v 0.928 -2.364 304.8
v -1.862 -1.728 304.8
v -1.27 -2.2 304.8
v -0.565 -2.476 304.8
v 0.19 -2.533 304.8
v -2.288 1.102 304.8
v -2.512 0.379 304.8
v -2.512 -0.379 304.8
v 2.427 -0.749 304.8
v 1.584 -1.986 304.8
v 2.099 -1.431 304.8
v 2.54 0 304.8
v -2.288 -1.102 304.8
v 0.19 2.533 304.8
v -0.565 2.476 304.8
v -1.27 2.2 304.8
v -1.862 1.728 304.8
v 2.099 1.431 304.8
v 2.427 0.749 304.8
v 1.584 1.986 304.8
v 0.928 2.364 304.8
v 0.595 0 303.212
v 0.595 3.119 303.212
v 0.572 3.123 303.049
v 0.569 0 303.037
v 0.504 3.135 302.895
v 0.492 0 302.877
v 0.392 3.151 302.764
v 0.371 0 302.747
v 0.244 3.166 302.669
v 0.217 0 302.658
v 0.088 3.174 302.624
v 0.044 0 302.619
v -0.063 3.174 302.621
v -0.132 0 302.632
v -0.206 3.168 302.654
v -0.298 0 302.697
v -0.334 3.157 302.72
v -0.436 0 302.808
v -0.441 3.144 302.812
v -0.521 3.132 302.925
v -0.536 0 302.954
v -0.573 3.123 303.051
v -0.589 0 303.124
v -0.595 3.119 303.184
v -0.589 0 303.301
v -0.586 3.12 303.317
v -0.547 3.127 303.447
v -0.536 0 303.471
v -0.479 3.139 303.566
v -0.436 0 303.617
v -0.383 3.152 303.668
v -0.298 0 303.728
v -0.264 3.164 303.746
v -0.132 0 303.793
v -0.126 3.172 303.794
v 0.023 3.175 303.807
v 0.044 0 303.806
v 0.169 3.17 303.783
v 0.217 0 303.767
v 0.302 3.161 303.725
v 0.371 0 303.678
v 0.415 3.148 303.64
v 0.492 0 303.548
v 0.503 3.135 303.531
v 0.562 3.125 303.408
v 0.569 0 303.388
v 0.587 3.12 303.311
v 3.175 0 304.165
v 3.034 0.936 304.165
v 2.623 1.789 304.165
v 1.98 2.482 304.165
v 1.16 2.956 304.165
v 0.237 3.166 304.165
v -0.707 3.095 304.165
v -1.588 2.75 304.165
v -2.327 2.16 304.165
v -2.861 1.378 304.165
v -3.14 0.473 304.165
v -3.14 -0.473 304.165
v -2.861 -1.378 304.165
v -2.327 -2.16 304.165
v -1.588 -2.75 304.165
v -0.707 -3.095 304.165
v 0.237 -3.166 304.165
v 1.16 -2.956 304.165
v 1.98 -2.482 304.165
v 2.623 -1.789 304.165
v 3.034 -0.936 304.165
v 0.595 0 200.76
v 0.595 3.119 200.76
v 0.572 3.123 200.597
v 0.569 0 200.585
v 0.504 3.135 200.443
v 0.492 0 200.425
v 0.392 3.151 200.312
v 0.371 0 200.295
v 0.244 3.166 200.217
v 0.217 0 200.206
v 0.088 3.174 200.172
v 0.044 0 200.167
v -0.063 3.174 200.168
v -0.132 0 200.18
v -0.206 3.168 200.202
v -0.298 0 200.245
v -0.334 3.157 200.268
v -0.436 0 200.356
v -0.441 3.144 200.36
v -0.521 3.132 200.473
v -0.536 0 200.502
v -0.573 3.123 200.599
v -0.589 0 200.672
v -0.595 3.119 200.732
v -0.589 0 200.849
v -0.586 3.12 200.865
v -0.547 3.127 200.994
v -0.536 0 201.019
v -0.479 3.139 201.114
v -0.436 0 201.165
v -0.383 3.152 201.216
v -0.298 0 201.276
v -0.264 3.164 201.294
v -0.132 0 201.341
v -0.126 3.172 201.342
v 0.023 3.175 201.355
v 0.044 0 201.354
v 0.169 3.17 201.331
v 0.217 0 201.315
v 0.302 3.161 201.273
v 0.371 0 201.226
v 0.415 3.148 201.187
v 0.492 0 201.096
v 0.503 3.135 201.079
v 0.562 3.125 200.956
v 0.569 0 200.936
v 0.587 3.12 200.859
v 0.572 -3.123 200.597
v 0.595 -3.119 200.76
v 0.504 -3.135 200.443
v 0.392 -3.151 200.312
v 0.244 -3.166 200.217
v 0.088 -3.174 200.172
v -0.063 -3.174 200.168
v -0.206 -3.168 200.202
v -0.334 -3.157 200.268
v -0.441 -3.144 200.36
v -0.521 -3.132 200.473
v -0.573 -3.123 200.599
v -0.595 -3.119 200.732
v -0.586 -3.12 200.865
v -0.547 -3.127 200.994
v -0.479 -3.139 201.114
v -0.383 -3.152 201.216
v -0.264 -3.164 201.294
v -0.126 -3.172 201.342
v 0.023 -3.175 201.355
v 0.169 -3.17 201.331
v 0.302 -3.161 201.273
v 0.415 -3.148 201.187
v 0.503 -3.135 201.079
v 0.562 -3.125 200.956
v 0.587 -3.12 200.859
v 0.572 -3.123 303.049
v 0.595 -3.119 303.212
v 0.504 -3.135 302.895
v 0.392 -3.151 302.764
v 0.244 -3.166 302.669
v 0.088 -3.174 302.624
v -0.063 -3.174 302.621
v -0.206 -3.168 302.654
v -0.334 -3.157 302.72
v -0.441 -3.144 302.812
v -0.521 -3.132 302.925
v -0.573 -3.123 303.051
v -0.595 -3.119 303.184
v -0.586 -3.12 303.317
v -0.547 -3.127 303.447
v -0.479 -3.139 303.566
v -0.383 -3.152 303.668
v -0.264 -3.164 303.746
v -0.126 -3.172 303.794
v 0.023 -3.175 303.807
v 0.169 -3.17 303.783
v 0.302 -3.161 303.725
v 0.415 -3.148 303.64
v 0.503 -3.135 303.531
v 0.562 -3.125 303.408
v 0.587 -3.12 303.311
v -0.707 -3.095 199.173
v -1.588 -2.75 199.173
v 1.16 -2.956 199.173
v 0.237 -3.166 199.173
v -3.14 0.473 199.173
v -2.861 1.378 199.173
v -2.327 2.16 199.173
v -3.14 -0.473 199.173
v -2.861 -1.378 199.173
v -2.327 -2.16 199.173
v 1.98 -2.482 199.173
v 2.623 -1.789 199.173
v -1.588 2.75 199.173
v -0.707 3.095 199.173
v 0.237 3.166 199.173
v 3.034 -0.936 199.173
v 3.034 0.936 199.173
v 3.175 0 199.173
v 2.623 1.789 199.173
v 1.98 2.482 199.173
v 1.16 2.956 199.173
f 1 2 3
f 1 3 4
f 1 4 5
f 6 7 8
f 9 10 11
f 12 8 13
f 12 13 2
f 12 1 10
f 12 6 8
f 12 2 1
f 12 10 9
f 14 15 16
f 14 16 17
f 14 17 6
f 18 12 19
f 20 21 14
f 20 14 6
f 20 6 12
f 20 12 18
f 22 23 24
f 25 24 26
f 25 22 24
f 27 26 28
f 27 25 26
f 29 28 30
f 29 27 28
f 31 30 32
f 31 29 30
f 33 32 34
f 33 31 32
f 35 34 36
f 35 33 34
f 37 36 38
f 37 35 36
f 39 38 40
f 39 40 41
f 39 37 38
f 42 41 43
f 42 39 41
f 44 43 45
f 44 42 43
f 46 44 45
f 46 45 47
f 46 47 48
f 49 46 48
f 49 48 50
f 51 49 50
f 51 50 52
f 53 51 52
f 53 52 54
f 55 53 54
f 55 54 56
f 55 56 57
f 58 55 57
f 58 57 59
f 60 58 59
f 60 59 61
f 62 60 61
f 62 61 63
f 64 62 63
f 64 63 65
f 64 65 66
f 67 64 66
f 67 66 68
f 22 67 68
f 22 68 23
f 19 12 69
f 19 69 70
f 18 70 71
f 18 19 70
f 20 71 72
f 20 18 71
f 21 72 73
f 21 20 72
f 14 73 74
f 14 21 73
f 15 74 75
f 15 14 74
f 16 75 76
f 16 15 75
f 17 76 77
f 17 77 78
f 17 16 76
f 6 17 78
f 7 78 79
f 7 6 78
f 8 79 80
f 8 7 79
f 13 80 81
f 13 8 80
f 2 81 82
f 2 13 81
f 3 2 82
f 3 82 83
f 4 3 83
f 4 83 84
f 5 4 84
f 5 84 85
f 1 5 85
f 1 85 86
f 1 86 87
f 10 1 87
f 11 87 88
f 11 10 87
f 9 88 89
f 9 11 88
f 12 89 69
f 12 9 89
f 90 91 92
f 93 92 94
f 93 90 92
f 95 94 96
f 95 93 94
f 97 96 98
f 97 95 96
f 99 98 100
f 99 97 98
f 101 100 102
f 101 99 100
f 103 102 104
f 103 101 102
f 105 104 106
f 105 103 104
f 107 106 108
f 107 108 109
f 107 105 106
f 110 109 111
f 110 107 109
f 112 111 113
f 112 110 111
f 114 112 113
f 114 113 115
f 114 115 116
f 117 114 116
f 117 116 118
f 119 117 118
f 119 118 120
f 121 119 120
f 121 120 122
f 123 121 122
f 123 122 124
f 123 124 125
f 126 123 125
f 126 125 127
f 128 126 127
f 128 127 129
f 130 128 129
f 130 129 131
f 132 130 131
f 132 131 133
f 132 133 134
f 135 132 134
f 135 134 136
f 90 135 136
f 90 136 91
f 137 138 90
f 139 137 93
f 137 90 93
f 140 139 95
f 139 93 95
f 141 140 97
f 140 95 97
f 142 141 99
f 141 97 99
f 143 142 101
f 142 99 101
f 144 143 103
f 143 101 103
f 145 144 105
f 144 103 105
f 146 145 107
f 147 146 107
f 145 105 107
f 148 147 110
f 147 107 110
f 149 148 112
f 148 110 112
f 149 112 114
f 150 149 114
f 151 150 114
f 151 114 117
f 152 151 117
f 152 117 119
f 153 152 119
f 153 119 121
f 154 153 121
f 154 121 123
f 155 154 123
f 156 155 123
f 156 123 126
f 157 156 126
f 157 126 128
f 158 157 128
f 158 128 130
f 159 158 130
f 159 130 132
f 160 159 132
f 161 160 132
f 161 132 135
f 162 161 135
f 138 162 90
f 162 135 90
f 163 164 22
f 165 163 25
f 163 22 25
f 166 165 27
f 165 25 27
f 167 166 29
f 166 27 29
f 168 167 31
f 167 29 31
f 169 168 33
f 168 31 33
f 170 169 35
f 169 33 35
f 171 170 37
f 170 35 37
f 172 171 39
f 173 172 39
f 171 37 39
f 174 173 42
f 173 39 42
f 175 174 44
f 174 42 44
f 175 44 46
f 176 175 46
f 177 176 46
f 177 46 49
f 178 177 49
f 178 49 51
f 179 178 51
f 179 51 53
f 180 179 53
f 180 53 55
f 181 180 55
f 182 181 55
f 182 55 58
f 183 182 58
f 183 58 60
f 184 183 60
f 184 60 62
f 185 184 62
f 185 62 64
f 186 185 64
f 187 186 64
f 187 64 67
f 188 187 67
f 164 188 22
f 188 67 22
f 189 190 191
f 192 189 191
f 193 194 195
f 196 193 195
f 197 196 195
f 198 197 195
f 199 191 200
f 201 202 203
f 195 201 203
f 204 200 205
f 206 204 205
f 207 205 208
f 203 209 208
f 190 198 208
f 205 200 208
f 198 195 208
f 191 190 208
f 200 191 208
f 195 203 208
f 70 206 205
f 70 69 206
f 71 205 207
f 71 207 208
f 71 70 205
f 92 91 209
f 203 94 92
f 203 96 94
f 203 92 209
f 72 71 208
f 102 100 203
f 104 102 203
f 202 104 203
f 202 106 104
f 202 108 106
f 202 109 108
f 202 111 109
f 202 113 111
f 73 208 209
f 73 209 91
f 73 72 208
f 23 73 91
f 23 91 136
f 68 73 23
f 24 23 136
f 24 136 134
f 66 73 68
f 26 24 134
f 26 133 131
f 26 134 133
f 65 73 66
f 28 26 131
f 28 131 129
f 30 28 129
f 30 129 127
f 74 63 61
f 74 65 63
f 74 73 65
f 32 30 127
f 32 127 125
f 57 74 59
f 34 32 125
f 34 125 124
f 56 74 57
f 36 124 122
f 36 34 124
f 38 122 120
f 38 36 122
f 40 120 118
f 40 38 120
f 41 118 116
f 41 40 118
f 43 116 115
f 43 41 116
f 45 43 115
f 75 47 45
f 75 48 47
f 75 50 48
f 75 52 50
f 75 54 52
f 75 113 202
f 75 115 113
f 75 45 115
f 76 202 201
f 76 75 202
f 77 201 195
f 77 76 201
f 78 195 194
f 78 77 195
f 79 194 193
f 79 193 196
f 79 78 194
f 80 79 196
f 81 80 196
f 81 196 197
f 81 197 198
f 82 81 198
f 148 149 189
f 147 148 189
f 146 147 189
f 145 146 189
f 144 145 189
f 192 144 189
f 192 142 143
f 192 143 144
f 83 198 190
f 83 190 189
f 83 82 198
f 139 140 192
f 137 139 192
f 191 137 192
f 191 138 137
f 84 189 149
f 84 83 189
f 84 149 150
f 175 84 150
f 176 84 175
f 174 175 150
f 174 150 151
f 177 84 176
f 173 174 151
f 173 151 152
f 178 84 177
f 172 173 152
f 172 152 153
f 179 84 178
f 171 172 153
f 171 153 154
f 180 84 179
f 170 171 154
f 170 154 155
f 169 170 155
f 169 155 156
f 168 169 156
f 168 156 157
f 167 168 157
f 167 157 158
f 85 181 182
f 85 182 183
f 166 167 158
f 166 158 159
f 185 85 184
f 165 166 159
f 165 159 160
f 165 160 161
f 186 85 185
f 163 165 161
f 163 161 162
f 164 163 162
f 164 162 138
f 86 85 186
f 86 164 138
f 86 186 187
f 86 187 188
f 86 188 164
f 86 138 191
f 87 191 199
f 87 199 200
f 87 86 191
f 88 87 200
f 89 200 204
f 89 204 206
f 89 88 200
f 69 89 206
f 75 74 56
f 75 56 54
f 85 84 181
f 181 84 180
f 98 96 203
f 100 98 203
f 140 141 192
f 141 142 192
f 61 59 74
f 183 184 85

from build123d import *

# Parameters (mm, degrees)
SKETCH3_R               = 3.175
BOSS_EXTRUDE1_DEPTH     = 304.8
CHAMFER1_SIZE           = 0.635
CUT_EXTRUDE1_START      = -105.627050112
SKETCH4_R               = 3.175
CUT_EXTRUDE1_DEPTH      = 504.972949888
SKETCH5_R               = 0.5953125
CUT_EXTRUDE2_DEPTH      = 4.175
CUT_EXTRUDE2_DEPTH_BACK = 4.175


with BuildPart() as part:
    # Sketch3 → Boss-Extrude1 (new body, symmetric)
    with BuildSketch(Plane.XY):
        Circle(SKETCH3_R)
    extrude(amount=BOSS_EXTRUDE1_DEPTH, both=True)

    # Chamfer1
    chamfer1_edges = [part.edges().sort_by_distance(p)[0] for p in [
        (-3.175, 0, -304.8),
        (-3.175, 0, 304.8),
    ]]
    chamfer(chamfer1_edges, length=CHAMFER1_SIZE)

    # Sketch4 → Cut-Extrude1 (cut, through all)
    with BuildSketch(Plane.XY.offset(304.8).offset(CUT_EXTRUDE1_START)):
        Circle(SKETCH4_R)
    extrude(amount=-CUT_EXTRUDE1_DEPTH, mode=Mode.SUBTRACT)

    # Sketch5 → Cut-Extrude2 (cut, two sides)
    with BuildSketch(Plane(origin=(0, 0, 0), x_dir=(1, 0, 0), z_dir=(0, 1, 0))) as cut_extrude2_sk:
        with Locations((0, -200.760449888)):
            Circle(SKETCH5_R)
        with Locations((0, -303.2125)):
            Circle(SKETCH5_R)
    extrude(amount=CUT_EXTRUDE2_DEPTH, mode=Mode.SUBTRACT)
    extrude(cut_extrude2_sk.sketch, amount=-CUT_EXTRUDE2_DEPTH_BACK, mode=Mode.SUBTRACT)


solid = part.part
